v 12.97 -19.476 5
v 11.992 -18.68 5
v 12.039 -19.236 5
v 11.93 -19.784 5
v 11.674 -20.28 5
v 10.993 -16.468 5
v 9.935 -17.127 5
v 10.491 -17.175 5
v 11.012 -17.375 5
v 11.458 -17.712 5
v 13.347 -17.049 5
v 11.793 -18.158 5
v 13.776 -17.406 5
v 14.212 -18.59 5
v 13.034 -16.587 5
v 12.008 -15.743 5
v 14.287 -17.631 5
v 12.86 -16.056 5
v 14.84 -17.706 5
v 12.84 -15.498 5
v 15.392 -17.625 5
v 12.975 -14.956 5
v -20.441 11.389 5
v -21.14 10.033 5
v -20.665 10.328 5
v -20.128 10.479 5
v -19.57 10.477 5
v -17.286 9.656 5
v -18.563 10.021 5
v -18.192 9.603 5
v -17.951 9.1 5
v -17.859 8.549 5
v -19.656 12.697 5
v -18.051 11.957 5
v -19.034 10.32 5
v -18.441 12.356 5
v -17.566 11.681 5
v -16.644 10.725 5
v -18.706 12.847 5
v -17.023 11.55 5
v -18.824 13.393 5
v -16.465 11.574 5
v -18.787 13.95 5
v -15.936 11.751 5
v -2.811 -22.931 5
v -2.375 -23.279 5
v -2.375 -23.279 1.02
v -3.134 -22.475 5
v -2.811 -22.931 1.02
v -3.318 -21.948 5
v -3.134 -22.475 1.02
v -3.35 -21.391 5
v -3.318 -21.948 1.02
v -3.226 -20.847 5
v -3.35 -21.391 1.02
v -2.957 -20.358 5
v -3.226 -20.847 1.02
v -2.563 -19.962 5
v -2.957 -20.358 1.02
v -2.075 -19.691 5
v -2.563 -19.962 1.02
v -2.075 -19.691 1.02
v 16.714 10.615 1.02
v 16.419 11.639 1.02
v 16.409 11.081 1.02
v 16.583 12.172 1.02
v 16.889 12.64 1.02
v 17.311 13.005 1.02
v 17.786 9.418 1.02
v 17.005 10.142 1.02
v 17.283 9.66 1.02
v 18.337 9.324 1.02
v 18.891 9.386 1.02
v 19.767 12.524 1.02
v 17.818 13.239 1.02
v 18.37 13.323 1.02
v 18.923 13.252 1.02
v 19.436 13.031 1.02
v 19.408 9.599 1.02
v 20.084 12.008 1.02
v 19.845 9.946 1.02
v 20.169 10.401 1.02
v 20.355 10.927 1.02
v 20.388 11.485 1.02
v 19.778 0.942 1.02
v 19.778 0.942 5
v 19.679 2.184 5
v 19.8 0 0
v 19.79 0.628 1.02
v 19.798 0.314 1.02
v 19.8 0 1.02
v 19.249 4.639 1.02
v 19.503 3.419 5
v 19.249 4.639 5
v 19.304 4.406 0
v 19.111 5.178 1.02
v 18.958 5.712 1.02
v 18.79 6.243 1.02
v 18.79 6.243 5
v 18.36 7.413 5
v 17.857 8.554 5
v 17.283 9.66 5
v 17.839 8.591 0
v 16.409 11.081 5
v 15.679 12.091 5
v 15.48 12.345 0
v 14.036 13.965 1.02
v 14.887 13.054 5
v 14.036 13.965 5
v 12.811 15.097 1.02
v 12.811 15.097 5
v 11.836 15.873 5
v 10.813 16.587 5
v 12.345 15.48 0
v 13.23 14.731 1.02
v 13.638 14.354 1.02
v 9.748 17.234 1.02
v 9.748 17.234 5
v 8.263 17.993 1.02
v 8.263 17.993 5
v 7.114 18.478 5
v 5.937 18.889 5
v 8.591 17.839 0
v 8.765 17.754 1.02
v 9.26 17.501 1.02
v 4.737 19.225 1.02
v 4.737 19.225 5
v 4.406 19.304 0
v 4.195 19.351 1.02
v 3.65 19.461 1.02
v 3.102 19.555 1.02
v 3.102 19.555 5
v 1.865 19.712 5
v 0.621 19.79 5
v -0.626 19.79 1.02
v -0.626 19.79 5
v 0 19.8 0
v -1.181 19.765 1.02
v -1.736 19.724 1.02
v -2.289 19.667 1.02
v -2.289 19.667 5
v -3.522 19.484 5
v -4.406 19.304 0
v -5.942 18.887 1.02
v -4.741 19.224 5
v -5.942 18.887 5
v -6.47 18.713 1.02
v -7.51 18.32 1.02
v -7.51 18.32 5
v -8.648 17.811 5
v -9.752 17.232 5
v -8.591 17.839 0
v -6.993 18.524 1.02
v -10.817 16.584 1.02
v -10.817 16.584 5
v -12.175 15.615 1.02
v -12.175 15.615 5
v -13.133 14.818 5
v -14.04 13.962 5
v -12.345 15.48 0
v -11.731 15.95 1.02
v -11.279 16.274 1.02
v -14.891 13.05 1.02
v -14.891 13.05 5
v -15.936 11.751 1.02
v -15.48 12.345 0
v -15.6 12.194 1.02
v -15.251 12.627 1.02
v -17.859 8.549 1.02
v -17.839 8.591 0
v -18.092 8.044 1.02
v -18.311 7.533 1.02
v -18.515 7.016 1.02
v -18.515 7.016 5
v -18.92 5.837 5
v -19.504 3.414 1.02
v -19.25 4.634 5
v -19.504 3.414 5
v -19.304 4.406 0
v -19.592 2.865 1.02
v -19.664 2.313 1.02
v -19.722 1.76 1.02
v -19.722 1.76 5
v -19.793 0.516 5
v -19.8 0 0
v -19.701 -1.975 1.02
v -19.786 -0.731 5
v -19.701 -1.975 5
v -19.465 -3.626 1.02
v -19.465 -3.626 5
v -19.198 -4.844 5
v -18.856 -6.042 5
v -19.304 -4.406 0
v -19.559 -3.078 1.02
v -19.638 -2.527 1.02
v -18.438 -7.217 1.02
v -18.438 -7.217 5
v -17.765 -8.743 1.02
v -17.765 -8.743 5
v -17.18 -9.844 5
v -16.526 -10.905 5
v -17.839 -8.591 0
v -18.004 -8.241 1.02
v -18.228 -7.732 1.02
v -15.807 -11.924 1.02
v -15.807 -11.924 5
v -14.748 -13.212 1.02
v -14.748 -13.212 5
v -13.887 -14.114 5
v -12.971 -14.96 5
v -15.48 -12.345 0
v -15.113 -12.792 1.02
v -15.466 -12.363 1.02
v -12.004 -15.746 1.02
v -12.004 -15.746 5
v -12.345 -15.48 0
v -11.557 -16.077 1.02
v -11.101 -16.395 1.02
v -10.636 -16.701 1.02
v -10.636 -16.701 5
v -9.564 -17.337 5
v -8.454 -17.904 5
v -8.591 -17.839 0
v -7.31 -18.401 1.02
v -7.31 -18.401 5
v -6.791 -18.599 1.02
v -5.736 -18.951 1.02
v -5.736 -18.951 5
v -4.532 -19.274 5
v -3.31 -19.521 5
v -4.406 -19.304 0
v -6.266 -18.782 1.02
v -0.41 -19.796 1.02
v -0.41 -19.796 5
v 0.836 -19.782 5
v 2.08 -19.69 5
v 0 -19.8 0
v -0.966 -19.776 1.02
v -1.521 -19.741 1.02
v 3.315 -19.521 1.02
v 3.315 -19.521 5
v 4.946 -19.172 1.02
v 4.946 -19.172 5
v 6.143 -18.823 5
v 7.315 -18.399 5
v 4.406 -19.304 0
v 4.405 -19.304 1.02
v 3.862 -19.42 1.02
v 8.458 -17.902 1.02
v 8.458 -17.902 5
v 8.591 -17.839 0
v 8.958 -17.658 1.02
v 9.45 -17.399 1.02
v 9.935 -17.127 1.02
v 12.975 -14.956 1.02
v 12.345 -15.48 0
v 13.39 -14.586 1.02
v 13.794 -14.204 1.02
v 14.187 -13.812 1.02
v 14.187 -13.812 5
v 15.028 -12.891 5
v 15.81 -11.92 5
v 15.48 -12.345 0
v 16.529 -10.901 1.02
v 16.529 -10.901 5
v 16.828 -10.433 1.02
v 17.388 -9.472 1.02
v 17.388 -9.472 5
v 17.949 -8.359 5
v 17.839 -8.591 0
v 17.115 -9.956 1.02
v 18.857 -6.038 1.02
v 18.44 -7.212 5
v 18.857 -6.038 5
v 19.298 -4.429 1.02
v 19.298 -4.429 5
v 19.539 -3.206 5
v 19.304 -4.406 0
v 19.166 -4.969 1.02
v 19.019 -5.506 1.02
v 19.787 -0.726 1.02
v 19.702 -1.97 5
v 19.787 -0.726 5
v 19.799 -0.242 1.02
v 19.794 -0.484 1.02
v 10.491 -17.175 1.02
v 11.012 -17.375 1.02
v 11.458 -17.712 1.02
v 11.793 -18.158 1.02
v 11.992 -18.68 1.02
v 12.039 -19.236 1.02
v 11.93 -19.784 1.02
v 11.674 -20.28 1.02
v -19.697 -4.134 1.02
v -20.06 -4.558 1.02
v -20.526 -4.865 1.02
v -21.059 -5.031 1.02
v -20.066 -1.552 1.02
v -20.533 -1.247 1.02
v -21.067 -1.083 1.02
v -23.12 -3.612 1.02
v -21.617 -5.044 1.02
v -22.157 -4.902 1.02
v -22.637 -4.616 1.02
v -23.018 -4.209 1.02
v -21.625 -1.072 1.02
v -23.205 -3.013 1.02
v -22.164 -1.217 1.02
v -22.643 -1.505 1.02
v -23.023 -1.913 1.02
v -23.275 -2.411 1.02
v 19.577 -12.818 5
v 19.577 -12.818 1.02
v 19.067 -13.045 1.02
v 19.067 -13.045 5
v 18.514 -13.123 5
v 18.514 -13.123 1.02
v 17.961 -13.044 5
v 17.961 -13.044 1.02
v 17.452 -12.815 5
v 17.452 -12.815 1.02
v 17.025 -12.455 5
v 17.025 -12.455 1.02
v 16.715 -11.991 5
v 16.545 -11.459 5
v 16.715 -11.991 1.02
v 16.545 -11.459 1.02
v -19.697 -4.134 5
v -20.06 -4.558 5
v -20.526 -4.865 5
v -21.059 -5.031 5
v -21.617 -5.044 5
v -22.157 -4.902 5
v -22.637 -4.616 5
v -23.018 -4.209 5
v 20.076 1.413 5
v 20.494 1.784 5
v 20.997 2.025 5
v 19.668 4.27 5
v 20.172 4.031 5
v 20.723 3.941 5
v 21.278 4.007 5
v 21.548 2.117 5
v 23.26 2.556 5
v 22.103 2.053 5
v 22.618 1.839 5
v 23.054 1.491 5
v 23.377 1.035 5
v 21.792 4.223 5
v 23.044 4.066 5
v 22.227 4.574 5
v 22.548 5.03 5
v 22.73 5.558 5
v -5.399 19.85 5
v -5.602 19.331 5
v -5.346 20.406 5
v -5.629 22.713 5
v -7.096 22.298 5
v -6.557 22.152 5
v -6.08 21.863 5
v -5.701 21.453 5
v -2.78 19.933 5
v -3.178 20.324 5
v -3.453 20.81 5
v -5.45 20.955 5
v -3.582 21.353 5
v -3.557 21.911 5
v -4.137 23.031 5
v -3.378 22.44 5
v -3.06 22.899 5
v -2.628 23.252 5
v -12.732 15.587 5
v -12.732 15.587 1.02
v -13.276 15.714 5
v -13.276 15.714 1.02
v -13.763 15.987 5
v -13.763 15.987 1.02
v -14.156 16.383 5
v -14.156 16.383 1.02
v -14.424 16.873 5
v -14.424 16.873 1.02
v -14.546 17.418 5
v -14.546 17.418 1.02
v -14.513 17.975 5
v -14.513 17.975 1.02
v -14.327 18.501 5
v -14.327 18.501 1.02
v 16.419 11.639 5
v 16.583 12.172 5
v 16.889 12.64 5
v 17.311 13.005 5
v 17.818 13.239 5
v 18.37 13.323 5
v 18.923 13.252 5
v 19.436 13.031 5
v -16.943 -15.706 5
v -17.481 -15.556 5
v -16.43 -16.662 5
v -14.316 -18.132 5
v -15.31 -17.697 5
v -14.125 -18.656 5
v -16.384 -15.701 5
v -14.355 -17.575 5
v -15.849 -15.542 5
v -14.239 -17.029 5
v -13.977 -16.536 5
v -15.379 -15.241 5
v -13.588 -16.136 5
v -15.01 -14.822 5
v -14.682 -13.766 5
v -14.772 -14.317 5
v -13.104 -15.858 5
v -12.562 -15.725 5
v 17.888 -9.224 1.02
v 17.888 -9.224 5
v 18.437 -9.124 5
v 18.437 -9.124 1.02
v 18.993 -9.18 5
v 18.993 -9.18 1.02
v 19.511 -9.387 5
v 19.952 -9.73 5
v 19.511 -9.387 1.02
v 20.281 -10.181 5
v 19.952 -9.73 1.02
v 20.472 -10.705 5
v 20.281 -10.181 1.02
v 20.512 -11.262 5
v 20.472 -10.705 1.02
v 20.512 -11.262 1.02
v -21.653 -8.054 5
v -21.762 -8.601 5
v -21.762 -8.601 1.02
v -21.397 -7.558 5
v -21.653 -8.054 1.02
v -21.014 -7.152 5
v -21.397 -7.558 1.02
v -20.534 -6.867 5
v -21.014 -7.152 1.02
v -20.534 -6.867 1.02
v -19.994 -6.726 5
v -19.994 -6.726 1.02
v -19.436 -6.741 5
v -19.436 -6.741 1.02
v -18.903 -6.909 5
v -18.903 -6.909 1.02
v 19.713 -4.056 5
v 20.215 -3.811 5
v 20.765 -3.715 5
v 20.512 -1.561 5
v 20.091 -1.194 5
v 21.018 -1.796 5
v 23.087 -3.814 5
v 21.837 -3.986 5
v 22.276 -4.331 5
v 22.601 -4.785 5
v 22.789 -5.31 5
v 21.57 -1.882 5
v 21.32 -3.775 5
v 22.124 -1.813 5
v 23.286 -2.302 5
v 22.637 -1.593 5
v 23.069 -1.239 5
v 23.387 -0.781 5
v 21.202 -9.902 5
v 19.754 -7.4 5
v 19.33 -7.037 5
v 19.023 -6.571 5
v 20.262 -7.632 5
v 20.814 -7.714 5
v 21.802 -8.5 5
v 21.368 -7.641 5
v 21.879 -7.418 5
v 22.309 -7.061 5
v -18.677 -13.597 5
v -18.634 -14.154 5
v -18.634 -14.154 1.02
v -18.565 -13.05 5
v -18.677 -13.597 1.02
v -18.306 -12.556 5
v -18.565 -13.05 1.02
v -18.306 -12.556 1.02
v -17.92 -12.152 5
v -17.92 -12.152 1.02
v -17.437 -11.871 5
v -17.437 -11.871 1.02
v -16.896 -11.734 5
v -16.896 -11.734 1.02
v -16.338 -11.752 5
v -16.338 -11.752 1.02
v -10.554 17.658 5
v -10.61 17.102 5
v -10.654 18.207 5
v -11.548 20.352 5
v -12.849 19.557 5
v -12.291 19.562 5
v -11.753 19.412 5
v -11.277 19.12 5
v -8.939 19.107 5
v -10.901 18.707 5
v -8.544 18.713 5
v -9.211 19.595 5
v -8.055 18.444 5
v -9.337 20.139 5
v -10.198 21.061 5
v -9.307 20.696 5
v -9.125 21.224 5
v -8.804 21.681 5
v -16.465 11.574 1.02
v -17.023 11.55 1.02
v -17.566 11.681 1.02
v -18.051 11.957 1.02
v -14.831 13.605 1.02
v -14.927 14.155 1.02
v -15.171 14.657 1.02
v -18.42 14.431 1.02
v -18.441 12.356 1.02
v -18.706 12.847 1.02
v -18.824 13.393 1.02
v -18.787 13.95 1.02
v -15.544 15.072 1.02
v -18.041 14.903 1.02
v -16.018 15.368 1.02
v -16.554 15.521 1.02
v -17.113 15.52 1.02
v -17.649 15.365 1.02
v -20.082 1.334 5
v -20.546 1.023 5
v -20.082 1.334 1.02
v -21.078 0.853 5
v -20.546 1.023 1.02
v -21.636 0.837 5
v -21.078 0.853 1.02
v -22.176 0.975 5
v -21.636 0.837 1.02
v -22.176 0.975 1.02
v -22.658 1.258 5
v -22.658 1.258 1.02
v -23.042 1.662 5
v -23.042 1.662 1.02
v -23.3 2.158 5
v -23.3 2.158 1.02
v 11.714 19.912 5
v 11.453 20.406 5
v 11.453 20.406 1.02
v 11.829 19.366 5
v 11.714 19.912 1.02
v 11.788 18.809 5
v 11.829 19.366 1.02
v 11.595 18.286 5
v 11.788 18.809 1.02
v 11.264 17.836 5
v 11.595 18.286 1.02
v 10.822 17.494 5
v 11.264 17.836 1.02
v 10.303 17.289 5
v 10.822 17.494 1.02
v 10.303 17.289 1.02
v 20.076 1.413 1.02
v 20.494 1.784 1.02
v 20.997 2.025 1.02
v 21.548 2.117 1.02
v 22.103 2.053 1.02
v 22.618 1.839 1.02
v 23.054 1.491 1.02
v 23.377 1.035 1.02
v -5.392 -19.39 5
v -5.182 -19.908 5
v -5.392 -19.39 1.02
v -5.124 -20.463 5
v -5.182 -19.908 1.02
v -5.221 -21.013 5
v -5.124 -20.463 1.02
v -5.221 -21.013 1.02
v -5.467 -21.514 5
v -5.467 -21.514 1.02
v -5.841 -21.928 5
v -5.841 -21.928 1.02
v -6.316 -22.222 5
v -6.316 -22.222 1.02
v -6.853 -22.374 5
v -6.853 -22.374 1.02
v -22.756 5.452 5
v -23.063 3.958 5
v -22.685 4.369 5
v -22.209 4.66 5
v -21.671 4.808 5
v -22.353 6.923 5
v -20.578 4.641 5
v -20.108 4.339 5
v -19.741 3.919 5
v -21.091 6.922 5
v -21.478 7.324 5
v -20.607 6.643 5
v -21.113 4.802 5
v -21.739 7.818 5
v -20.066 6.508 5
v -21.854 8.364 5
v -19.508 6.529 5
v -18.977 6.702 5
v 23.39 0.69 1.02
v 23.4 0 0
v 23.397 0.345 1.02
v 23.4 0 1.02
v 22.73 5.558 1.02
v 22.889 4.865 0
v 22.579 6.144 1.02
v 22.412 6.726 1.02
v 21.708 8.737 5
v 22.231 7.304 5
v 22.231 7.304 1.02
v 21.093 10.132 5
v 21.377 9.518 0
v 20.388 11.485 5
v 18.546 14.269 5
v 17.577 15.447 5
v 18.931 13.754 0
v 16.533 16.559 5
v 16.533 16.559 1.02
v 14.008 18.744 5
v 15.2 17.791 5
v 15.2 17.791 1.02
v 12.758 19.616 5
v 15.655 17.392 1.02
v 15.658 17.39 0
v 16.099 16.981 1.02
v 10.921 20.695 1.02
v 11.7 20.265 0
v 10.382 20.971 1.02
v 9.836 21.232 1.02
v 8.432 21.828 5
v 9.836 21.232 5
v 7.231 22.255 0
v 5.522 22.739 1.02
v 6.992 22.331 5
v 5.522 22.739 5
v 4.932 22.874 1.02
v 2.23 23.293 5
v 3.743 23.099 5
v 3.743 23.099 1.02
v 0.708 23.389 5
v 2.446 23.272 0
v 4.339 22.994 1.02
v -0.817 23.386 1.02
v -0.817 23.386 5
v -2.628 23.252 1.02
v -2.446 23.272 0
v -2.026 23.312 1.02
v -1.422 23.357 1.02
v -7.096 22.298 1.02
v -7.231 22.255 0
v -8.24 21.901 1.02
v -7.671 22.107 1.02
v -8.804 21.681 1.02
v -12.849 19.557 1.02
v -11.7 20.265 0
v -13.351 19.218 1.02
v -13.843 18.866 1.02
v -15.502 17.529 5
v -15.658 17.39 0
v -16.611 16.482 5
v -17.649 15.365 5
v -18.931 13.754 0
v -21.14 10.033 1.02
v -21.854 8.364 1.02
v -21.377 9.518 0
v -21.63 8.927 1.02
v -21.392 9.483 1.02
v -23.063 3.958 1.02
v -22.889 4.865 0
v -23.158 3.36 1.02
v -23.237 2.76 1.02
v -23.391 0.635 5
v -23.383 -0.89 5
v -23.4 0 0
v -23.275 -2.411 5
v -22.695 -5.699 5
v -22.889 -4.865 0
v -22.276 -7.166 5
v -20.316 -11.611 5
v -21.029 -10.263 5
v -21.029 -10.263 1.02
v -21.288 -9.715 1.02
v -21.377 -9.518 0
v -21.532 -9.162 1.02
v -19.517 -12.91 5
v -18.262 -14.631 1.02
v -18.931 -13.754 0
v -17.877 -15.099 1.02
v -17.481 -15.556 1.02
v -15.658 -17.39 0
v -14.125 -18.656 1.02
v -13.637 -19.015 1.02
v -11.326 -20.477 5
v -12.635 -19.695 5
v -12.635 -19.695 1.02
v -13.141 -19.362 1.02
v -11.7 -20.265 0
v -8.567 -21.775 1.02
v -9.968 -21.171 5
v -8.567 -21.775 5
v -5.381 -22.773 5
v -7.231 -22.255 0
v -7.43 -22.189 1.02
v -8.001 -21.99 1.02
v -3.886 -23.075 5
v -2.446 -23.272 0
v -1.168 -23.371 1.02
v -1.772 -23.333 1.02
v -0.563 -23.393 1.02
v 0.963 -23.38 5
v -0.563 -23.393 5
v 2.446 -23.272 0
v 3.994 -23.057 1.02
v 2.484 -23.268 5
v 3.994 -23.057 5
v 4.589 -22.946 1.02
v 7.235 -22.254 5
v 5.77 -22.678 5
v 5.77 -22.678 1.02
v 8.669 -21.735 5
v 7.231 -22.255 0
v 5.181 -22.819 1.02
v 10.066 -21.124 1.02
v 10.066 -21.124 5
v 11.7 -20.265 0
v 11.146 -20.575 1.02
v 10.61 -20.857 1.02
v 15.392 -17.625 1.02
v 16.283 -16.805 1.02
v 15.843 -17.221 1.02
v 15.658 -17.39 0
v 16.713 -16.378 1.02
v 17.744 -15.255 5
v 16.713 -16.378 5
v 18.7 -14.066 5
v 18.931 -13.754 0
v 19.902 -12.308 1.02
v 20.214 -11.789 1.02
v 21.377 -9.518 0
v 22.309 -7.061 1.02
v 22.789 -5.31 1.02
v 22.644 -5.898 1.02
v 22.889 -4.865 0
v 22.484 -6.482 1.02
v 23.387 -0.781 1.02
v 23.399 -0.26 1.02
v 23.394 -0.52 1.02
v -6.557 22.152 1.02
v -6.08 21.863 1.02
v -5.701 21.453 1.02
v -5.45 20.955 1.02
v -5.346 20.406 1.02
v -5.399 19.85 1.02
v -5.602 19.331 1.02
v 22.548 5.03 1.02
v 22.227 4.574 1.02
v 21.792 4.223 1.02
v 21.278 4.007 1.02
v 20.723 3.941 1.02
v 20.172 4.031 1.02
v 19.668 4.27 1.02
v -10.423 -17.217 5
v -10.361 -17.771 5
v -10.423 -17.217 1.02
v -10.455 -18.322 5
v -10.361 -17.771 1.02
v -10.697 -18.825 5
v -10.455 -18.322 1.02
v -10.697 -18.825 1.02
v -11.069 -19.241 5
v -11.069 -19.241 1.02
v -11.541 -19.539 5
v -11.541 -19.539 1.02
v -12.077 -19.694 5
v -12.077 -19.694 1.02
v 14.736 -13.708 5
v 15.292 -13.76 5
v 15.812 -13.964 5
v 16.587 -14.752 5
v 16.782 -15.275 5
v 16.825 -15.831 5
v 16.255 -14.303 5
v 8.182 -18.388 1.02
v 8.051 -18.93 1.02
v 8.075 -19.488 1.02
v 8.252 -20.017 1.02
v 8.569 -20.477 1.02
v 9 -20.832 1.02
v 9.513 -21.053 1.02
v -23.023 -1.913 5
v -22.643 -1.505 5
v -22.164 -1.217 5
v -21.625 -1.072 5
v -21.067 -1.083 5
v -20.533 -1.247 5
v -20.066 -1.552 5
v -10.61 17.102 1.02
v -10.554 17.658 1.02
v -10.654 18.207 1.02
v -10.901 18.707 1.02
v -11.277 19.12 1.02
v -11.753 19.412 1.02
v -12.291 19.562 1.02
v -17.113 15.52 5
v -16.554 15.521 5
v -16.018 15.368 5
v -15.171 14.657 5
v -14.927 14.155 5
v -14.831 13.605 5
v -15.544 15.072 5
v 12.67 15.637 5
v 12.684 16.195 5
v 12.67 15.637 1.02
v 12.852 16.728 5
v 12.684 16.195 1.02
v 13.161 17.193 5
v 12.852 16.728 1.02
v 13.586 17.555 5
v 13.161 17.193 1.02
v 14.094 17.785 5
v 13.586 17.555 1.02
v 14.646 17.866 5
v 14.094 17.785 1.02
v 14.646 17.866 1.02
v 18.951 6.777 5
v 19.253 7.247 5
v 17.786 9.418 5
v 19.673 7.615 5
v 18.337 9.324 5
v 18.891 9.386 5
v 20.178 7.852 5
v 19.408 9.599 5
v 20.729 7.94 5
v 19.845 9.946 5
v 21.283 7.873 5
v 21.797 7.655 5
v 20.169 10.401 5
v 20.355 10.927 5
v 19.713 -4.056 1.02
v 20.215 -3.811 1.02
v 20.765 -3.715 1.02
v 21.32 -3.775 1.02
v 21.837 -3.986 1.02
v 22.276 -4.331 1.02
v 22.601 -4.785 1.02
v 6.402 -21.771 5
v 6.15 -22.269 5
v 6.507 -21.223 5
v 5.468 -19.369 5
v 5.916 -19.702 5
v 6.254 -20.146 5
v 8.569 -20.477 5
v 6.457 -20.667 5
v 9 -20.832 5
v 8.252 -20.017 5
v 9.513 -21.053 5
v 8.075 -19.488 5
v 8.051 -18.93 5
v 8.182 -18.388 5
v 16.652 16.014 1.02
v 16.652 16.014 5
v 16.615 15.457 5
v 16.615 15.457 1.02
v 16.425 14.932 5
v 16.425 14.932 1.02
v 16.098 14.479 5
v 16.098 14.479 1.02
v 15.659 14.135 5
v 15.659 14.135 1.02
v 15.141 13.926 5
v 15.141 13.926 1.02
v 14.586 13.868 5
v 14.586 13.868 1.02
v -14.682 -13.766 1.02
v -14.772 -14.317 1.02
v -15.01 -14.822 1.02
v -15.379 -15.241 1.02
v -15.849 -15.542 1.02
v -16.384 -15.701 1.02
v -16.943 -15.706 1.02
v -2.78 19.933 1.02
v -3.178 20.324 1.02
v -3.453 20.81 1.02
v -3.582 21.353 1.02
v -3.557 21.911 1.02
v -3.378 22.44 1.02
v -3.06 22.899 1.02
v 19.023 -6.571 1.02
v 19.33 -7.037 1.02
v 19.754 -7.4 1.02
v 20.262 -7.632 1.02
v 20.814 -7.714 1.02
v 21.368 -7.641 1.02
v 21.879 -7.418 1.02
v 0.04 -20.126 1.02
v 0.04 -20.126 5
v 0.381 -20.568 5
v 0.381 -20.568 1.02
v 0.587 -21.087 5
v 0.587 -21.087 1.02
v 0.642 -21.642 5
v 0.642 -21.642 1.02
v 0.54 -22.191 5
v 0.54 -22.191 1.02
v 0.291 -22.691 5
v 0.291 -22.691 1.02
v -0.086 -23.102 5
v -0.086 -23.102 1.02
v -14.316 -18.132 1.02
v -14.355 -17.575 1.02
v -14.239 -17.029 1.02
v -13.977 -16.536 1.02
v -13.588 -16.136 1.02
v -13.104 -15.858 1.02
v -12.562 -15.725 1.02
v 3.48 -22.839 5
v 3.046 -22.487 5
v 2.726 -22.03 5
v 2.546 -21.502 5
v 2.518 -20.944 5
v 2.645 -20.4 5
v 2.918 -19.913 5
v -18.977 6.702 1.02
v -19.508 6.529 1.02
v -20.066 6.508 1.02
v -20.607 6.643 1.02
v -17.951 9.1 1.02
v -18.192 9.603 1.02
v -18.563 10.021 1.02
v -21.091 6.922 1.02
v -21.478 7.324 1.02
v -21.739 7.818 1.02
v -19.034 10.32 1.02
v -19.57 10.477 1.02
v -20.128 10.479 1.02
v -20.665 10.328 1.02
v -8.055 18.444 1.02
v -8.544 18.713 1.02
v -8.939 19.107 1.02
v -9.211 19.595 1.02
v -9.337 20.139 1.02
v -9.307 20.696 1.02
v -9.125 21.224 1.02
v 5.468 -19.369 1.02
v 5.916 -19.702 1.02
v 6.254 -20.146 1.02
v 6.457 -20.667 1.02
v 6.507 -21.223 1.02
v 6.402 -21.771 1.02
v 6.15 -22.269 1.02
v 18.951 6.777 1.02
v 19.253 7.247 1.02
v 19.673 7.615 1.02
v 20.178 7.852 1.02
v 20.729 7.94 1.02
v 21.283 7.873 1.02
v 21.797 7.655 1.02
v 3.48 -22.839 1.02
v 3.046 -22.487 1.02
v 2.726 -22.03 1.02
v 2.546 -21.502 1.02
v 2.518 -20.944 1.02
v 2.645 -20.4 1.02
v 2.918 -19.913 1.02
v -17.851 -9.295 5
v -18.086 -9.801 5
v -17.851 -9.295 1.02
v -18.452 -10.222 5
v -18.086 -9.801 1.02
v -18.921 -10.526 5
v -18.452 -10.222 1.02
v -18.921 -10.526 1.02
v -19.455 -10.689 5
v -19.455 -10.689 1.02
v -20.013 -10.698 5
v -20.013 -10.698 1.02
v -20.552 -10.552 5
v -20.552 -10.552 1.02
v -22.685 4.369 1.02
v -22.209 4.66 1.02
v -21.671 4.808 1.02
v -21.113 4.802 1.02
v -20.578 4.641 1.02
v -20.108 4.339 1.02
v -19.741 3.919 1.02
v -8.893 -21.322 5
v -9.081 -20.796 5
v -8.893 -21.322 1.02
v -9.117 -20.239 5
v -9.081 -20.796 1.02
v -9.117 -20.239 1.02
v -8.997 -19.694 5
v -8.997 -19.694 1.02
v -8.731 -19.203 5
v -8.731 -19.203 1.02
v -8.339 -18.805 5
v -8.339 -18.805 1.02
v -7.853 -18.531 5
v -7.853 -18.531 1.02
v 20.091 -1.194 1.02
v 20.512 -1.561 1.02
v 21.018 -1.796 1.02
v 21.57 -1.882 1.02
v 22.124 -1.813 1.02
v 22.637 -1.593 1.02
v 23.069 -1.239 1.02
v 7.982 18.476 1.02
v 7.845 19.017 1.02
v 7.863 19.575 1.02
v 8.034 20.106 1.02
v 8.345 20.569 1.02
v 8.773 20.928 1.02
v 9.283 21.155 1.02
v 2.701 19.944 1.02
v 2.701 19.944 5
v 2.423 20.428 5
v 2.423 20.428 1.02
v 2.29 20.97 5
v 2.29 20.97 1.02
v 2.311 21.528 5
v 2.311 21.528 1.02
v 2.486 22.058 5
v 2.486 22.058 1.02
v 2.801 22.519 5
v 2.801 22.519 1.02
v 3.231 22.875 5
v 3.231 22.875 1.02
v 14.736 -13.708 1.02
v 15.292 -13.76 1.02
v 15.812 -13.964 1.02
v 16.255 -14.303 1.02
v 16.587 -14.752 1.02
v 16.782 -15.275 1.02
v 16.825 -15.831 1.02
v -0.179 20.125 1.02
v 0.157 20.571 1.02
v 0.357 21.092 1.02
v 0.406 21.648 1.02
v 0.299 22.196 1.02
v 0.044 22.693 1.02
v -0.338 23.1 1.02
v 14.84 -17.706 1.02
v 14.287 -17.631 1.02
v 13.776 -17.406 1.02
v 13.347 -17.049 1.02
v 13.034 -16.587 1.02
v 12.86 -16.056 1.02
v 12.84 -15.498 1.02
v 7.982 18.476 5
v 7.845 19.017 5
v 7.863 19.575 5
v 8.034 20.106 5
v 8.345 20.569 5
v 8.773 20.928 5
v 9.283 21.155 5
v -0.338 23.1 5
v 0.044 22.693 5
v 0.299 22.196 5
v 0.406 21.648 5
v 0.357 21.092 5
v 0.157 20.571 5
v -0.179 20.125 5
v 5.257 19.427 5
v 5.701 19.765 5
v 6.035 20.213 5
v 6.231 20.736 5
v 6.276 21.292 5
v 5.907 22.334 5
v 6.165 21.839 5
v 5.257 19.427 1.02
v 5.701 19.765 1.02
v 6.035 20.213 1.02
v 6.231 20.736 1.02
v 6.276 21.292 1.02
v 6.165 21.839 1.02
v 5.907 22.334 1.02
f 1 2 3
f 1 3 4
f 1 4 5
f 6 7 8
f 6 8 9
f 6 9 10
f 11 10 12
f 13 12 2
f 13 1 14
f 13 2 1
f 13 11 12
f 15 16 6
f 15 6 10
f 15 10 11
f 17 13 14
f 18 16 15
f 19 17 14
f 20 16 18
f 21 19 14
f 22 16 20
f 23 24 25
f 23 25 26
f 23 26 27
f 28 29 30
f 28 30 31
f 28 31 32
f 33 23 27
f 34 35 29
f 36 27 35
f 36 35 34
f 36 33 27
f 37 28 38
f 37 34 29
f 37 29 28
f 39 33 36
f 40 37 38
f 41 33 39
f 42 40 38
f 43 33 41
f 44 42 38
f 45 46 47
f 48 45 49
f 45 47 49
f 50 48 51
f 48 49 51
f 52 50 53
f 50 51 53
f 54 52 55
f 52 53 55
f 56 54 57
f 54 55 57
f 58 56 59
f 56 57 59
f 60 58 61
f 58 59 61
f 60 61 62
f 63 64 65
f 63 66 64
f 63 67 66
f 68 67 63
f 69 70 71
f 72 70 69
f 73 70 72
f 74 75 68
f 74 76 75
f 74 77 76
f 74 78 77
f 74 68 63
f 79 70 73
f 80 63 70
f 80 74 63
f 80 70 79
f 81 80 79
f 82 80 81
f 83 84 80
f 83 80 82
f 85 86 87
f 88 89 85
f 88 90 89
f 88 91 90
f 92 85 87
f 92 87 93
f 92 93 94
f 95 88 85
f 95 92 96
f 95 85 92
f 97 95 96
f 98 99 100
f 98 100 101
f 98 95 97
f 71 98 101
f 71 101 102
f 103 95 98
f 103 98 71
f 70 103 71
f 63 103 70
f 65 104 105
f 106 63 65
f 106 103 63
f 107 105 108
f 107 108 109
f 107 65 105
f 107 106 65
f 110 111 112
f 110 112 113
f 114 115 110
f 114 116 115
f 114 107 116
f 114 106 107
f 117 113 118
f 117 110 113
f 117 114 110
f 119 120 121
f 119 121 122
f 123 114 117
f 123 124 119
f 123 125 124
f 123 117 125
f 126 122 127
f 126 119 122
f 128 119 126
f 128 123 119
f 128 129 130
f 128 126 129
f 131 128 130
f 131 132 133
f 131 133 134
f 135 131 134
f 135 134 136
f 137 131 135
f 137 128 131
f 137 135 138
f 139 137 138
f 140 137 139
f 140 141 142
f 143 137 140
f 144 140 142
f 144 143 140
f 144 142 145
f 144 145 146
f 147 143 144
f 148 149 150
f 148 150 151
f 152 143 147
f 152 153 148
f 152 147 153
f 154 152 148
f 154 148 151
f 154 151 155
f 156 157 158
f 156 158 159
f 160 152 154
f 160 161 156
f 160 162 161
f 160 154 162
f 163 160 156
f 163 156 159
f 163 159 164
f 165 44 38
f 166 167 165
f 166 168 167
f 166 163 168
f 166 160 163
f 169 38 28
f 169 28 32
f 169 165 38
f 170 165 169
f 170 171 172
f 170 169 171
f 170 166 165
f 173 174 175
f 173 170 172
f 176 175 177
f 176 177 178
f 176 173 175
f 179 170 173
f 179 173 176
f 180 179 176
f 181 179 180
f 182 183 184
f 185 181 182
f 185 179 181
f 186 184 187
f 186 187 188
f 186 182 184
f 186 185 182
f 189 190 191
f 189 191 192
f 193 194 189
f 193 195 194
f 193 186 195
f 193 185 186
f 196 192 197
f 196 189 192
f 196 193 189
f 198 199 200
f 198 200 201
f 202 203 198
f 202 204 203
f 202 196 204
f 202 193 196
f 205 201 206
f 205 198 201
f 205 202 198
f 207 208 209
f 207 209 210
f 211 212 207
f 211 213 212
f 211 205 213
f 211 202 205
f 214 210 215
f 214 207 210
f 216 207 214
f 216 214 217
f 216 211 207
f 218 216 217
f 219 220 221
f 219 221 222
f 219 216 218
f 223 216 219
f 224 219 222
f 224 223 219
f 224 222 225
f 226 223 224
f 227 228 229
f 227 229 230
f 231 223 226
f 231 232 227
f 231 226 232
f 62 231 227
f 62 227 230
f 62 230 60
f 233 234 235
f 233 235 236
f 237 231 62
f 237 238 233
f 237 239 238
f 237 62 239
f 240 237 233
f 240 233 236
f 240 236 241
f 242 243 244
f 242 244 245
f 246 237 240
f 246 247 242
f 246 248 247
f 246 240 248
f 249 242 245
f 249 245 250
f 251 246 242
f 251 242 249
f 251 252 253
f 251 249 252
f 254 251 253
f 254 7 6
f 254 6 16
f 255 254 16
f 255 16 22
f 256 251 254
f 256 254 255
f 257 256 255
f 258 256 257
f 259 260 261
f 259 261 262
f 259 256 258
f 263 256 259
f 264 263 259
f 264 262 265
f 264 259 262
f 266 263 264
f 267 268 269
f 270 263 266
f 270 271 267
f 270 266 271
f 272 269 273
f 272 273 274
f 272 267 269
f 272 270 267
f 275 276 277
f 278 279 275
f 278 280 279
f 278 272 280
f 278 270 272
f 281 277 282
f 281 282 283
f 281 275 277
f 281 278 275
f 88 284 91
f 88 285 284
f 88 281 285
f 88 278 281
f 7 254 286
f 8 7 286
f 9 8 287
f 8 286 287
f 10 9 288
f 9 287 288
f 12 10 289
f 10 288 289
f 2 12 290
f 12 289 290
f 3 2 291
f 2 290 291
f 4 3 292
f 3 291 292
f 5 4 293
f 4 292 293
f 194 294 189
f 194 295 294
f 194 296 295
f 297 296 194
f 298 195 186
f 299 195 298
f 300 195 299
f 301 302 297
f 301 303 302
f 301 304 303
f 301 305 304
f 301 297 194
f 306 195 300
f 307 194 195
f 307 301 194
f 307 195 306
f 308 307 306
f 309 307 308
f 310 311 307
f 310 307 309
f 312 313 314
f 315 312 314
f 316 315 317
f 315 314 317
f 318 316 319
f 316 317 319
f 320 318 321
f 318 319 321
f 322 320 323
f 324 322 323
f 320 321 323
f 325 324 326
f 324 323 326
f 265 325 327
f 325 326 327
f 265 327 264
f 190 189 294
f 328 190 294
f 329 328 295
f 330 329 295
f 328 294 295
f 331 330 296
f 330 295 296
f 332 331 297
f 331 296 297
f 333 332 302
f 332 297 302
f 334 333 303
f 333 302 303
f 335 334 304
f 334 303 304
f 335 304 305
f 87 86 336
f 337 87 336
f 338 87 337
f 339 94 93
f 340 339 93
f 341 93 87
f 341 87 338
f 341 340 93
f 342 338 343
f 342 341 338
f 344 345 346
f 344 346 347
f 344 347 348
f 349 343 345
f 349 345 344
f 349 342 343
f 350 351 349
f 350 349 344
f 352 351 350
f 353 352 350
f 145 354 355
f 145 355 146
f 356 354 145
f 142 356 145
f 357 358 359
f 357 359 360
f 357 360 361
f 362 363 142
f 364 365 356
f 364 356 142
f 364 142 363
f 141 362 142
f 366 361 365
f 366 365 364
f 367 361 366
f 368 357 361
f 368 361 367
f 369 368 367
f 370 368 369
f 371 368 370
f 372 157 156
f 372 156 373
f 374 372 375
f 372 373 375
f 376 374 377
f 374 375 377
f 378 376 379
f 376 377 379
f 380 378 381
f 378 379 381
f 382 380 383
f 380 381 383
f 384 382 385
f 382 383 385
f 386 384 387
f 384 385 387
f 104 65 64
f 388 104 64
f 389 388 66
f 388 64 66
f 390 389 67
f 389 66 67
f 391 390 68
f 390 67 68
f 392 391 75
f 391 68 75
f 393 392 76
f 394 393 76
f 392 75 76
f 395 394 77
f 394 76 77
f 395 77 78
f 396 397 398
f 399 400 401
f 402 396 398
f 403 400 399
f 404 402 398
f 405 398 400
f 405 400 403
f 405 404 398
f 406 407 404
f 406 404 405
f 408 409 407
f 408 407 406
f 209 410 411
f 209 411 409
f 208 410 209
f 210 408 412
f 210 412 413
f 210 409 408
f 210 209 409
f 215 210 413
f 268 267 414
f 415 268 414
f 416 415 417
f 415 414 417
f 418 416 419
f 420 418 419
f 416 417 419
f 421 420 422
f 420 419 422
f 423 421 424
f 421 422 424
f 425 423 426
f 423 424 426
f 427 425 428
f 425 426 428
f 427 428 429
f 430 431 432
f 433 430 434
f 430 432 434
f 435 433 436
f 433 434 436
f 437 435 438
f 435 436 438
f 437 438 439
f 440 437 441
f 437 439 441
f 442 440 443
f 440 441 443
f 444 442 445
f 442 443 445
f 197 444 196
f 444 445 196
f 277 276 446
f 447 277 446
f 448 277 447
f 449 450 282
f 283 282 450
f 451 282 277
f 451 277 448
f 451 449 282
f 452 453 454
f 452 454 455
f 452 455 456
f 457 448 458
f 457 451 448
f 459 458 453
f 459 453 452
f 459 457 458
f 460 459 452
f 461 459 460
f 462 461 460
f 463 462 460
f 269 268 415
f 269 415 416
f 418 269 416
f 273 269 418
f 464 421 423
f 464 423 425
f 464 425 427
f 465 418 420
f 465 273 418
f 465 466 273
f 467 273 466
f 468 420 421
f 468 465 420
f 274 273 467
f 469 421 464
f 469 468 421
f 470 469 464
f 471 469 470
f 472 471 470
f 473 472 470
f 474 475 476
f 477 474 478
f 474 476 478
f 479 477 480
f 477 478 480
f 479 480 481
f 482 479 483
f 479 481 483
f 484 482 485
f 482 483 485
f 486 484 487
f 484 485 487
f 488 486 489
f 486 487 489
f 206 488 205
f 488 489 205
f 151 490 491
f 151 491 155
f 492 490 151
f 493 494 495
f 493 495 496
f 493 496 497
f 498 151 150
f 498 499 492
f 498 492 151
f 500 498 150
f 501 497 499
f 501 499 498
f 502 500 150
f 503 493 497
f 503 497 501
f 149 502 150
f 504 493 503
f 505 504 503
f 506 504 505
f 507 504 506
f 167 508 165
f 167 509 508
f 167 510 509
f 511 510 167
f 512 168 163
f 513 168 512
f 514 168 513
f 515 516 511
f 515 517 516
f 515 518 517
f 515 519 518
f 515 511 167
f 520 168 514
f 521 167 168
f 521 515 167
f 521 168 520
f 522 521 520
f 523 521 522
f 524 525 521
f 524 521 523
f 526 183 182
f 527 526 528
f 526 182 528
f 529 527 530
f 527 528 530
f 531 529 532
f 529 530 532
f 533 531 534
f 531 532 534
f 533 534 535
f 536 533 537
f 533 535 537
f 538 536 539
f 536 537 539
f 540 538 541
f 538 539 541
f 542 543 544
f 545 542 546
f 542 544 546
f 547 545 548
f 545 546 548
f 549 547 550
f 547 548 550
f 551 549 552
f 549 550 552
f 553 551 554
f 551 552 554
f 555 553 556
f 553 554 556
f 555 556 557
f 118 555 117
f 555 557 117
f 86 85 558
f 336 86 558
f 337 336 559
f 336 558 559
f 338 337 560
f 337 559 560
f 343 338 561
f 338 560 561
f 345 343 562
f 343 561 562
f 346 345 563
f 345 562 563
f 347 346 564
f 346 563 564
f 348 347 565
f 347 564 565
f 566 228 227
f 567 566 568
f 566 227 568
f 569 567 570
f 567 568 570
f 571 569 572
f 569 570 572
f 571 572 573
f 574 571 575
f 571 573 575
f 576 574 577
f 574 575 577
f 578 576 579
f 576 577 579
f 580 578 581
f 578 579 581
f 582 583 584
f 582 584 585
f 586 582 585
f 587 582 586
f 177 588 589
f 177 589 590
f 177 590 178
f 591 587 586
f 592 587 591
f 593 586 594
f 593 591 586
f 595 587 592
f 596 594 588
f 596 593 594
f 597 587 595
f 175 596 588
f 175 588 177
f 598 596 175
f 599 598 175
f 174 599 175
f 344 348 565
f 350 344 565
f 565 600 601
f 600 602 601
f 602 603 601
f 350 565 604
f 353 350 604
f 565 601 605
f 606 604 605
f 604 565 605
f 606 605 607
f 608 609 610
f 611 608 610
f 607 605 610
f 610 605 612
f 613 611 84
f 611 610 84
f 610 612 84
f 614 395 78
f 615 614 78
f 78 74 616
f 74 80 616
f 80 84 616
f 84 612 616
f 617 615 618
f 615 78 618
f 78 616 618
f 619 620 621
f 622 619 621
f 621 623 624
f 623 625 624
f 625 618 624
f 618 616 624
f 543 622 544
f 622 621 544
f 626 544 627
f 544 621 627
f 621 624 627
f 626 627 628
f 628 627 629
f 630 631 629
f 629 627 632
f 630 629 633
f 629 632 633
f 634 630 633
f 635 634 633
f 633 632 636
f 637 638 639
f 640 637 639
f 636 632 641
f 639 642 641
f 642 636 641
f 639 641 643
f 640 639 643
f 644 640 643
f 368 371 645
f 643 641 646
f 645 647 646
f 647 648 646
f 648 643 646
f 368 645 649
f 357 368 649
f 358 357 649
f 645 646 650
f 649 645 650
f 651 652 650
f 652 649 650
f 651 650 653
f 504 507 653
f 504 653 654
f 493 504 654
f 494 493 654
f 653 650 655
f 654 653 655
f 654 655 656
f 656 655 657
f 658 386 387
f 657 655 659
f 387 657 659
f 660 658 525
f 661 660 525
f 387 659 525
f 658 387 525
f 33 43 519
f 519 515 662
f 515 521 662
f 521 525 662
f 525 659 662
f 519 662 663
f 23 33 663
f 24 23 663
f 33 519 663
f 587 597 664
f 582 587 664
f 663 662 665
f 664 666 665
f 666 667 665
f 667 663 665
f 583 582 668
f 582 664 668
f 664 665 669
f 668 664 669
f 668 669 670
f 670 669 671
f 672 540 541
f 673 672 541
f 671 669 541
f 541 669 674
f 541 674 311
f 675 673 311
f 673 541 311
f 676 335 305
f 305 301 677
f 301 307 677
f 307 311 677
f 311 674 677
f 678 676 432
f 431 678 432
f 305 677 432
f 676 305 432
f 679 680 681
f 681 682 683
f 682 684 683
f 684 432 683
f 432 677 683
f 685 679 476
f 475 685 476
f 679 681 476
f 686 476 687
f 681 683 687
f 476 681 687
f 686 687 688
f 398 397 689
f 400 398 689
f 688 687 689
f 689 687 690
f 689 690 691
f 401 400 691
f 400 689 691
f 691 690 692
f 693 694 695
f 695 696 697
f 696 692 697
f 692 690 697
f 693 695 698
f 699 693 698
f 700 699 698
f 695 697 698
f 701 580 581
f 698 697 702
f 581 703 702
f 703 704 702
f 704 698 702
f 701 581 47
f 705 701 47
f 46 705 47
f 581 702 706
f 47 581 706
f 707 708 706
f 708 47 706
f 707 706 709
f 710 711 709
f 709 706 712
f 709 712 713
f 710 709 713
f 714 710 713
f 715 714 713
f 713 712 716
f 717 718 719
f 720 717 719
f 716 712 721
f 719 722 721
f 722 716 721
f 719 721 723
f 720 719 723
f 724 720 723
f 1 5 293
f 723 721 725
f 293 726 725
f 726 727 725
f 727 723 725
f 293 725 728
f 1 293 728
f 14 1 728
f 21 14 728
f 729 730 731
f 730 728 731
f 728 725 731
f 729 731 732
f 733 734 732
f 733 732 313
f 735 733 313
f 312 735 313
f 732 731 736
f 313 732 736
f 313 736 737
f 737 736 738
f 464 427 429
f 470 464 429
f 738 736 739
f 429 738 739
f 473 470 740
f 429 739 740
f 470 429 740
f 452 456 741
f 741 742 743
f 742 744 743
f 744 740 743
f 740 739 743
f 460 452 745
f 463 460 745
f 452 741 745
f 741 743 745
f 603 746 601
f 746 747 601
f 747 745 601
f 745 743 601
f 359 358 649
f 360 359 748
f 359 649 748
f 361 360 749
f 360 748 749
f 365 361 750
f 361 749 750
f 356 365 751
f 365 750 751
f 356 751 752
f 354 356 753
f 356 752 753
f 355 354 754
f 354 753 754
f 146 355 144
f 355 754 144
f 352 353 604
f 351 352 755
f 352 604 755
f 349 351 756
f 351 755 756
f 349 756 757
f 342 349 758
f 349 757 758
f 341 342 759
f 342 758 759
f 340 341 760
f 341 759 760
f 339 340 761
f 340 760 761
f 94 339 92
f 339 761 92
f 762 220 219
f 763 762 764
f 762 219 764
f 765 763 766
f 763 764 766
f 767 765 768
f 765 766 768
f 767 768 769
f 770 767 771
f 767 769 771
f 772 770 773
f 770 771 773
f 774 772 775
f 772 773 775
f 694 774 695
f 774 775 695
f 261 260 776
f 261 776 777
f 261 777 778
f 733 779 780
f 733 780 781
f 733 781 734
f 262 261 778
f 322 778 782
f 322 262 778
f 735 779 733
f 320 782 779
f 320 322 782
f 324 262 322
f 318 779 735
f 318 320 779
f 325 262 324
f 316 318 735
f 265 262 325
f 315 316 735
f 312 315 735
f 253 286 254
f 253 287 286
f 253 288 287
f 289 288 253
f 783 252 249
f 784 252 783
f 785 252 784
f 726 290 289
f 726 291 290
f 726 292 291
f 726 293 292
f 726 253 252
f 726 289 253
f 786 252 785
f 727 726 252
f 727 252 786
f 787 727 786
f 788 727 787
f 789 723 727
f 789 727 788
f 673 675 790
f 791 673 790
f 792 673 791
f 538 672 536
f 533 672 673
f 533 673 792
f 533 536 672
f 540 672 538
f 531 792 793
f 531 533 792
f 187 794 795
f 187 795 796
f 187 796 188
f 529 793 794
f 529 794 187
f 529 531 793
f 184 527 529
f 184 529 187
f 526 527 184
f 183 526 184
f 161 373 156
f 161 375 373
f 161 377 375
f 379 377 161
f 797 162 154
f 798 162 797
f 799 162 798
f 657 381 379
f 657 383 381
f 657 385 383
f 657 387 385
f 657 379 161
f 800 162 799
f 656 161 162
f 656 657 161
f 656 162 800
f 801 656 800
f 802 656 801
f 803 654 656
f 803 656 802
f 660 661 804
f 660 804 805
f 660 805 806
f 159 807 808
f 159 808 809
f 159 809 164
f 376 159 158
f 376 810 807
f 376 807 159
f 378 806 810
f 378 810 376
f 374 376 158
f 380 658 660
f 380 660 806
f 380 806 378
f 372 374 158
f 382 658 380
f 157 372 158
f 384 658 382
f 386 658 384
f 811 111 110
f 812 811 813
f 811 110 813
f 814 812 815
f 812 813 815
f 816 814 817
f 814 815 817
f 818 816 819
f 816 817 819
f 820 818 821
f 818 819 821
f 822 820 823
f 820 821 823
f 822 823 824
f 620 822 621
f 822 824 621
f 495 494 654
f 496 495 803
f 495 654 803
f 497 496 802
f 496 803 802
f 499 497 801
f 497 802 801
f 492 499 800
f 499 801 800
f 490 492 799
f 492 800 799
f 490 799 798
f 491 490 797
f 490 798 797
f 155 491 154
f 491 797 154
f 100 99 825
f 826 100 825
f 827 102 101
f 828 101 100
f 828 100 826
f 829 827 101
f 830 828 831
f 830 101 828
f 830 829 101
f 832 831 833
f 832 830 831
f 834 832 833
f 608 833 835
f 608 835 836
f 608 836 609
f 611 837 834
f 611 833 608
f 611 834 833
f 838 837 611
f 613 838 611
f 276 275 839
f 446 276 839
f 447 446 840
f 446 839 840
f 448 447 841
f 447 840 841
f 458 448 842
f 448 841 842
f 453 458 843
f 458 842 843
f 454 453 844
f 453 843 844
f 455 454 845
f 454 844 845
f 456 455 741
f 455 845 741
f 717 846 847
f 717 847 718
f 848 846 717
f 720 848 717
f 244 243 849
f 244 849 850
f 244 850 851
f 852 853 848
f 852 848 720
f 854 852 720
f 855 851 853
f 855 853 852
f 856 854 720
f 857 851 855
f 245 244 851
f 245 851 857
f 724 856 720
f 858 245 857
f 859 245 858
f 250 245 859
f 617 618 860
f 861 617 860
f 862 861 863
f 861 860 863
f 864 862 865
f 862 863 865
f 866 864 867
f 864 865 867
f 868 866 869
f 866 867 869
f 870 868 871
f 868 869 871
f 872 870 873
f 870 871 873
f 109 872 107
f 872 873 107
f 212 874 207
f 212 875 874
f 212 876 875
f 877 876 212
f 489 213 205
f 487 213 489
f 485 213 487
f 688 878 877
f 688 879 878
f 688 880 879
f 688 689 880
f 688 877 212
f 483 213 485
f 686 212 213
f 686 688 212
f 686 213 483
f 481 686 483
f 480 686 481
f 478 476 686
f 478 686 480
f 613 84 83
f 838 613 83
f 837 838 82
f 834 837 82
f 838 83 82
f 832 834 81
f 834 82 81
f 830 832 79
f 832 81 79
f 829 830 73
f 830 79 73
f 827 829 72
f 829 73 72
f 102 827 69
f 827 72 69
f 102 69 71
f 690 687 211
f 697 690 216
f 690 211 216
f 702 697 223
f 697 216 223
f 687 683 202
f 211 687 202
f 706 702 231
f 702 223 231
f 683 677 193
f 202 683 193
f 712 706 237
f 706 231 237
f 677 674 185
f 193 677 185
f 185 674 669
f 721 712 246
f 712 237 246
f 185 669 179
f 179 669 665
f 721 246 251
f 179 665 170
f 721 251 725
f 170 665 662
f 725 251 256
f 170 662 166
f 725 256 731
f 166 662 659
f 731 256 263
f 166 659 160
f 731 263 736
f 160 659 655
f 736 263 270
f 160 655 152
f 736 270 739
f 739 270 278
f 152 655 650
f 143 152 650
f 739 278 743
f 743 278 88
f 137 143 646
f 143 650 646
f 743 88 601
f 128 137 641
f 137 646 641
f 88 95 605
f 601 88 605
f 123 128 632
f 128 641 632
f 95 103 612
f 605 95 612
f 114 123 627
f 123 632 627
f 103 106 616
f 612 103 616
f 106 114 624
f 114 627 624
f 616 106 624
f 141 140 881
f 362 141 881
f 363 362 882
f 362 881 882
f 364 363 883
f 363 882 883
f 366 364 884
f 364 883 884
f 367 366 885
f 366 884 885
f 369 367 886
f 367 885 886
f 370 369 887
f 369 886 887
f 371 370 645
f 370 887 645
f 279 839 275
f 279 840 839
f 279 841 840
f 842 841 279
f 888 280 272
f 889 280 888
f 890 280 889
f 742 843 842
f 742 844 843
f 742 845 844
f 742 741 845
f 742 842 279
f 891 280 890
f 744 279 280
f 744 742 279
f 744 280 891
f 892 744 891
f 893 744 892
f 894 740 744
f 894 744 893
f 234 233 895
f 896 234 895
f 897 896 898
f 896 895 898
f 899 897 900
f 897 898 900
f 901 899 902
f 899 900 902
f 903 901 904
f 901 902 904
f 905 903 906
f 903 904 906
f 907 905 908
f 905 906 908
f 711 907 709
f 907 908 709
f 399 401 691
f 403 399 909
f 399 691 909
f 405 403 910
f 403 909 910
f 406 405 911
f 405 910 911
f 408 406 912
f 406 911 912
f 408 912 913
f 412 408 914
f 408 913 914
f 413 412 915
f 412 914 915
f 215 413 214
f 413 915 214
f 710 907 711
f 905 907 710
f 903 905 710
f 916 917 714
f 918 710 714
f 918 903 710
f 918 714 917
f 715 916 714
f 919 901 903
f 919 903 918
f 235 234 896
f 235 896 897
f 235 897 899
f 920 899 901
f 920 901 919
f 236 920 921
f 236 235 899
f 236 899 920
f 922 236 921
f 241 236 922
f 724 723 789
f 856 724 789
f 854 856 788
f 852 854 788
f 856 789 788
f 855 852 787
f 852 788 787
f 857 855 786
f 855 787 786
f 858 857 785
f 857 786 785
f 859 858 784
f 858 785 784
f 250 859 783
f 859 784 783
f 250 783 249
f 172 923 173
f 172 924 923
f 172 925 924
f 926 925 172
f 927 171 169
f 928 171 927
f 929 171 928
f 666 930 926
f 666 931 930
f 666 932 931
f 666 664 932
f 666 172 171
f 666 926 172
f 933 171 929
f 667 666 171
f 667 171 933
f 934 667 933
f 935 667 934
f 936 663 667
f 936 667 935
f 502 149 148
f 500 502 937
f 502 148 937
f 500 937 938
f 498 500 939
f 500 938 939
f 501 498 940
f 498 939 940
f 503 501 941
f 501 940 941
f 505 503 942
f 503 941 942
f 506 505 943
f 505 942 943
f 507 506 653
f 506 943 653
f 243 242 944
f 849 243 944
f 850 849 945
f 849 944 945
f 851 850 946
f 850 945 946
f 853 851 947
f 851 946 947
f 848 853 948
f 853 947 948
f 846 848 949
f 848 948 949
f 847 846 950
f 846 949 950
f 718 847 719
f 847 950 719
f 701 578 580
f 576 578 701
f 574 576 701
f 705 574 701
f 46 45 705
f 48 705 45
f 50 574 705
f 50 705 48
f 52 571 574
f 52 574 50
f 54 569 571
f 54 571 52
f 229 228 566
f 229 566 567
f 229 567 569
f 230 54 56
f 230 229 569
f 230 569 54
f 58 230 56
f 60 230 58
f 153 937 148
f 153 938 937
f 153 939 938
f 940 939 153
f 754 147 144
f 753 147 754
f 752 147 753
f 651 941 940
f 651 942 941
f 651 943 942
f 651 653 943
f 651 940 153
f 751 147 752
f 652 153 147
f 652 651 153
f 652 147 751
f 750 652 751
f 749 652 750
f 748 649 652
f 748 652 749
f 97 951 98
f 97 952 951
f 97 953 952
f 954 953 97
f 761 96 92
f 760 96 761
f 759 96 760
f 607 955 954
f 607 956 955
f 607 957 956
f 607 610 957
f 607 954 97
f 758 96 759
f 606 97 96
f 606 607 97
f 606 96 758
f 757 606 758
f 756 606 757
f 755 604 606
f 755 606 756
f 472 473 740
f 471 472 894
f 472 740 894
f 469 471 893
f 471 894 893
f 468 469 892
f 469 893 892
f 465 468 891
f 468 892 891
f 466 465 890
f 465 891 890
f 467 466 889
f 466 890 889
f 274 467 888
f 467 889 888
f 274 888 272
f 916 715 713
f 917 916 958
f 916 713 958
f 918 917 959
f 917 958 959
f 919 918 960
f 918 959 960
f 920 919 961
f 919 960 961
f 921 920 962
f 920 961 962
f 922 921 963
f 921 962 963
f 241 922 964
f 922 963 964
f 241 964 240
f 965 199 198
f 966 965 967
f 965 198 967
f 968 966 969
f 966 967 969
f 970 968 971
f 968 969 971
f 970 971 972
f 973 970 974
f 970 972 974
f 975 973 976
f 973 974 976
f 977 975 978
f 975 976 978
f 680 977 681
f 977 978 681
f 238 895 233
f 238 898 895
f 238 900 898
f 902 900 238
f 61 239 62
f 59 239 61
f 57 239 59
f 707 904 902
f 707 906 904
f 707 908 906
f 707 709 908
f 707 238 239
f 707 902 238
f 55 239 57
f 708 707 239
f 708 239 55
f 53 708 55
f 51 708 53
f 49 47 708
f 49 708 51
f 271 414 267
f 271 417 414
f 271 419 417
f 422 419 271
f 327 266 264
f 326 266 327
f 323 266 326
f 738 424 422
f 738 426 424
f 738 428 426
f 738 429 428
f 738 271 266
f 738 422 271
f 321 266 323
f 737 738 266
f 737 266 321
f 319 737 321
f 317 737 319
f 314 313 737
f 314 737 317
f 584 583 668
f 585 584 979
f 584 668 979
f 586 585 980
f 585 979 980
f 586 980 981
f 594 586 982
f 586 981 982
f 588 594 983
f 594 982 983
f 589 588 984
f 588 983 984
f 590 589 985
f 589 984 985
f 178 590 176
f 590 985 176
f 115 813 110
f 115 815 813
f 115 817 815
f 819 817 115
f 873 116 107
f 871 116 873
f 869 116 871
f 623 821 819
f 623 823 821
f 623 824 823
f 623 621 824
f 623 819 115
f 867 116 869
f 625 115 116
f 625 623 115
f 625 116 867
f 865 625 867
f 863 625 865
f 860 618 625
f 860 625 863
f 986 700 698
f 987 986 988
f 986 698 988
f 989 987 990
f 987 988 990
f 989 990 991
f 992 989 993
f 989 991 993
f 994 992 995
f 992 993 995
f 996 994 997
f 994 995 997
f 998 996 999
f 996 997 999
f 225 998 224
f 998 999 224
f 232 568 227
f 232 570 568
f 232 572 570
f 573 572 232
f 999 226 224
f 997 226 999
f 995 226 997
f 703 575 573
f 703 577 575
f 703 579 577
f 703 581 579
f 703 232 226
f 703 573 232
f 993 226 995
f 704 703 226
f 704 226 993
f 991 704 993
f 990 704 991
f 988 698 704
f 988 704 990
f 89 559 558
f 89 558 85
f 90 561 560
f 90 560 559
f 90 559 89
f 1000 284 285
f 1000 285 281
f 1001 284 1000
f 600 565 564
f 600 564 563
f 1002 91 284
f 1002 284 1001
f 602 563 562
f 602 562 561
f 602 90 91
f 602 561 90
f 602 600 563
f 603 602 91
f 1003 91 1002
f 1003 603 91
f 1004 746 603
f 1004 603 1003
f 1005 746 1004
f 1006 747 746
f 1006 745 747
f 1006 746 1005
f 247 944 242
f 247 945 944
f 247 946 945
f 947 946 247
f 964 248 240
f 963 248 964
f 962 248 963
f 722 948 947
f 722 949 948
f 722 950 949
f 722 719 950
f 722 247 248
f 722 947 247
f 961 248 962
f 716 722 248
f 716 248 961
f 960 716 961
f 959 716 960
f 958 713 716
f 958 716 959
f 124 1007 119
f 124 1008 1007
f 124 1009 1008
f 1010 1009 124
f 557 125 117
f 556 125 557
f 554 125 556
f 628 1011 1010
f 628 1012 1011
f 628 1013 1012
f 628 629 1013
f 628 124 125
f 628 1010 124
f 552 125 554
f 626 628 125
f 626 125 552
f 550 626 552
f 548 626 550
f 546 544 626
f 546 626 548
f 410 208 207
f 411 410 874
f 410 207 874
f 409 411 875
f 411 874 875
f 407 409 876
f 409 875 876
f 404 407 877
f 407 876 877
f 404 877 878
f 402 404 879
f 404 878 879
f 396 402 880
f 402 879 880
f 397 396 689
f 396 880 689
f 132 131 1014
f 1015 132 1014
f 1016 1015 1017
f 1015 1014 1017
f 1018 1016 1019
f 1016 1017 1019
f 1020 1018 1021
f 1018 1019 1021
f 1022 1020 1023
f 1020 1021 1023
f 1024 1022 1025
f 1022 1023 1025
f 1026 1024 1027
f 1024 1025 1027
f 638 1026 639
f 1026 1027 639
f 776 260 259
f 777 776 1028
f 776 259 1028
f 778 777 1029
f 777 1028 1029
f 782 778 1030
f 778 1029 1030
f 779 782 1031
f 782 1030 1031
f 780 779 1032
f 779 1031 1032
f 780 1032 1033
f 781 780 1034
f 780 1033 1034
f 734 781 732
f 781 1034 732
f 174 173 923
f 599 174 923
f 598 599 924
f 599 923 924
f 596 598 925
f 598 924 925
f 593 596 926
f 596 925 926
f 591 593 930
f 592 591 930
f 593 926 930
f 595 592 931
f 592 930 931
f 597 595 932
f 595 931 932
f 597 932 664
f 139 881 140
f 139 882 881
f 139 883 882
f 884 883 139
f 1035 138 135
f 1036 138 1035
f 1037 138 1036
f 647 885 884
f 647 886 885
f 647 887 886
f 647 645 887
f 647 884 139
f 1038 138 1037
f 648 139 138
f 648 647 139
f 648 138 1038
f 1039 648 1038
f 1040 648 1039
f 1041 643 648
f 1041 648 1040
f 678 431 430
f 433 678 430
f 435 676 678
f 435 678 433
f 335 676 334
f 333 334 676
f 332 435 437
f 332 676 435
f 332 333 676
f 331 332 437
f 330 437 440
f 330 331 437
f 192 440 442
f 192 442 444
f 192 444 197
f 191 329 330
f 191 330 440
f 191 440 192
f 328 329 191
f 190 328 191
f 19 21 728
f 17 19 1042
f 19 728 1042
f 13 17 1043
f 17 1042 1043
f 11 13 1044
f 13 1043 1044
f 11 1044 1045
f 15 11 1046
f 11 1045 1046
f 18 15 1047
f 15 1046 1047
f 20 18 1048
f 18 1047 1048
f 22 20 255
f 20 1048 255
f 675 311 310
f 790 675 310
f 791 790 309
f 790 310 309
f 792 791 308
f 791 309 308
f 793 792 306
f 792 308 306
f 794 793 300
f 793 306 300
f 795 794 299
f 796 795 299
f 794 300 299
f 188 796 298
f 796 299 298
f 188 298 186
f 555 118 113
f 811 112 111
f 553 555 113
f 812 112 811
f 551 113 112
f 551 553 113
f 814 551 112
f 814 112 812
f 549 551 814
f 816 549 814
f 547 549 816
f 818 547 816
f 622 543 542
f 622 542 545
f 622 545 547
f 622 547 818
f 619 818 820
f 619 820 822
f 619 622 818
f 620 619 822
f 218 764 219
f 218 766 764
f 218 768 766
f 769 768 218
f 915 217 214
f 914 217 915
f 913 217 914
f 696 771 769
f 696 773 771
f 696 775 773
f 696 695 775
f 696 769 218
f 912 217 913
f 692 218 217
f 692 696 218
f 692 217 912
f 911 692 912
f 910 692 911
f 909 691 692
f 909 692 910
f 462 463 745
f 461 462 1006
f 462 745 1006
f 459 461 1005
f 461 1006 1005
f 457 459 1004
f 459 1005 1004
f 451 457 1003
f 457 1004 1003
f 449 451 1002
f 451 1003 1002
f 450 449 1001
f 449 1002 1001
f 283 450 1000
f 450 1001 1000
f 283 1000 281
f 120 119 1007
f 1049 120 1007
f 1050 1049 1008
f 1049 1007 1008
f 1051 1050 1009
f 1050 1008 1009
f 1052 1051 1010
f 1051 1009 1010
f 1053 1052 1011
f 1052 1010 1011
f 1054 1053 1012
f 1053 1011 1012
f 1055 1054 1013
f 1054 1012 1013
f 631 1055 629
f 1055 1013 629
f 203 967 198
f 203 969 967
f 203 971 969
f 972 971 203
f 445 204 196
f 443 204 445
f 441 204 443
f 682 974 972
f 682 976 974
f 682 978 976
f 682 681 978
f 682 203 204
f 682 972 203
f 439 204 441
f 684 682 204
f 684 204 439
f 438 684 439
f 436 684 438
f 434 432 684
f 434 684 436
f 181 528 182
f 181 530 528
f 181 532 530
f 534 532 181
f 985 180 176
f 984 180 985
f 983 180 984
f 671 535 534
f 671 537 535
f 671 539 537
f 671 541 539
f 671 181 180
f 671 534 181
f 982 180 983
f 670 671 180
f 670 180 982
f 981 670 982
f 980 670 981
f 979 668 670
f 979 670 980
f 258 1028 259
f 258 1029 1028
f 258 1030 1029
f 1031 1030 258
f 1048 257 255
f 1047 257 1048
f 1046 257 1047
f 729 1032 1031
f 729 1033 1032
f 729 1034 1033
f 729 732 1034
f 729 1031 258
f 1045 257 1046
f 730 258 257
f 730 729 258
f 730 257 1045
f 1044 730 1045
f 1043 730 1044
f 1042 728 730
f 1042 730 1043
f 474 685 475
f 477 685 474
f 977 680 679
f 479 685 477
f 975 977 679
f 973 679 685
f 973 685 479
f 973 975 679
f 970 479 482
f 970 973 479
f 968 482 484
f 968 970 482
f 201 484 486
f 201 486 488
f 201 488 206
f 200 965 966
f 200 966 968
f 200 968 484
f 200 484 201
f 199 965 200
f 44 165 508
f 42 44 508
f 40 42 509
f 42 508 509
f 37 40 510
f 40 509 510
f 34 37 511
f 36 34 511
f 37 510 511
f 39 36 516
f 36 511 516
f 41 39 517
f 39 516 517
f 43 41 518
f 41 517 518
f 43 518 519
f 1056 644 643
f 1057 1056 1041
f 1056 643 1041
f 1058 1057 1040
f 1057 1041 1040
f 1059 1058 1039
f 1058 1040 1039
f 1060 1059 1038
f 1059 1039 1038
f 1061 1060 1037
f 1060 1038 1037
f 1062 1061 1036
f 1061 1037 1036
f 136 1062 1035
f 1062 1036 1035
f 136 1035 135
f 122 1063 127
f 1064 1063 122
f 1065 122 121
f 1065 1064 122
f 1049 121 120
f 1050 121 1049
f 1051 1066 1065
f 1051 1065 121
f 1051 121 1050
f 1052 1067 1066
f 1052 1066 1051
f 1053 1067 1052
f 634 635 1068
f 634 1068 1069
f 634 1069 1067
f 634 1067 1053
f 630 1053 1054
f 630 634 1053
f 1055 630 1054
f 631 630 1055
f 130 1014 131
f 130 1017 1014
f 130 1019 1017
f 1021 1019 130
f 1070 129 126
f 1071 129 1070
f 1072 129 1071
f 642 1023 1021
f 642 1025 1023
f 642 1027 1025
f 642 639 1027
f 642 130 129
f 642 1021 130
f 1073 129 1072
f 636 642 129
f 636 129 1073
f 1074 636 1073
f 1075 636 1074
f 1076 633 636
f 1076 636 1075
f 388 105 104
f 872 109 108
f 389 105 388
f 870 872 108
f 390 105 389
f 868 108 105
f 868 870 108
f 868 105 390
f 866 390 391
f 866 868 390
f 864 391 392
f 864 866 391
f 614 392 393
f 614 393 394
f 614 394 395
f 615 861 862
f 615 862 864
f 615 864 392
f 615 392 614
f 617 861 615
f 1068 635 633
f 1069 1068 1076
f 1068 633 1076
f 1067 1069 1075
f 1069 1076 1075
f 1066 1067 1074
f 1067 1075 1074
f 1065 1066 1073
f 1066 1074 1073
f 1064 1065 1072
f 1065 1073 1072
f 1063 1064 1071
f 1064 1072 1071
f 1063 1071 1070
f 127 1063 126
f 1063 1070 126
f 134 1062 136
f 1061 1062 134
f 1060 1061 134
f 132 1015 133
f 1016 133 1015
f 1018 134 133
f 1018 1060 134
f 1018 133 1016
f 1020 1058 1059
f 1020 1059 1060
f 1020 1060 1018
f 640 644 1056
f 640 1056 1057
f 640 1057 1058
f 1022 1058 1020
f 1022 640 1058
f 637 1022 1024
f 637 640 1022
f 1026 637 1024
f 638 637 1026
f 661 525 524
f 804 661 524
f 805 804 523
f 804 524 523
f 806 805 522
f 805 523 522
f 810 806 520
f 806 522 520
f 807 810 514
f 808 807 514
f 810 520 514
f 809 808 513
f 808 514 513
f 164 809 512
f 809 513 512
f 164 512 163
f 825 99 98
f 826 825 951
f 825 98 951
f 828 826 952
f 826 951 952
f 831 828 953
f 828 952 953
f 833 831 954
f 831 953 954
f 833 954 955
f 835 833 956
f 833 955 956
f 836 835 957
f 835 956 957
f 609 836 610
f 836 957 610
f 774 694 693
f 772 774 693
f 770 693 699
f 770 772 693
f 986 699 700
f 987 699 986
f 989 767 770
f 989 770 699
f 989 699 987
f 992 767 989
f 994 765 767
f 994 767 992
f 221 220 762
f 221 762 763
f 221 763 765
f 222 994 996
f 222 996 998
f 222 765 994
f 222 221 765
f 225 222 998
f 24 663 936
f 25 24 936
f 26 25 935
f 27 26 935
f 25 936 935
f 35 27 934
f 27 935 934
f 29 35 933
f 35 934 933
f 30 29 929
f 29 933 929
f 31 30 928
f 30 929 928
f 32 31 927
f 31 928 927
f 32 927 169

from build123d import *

# Parameters (mm, degrees)
SKETCH_1_R               = 23.4
SKETCH_1_R_2             = 19.8
EXTRUDE_1_DEPTH          = 5
SKETCH_2_W               = 4
SKETCH_2_H               = 2
PATTERN_CIRCULAR_1_COUNT = 23


with BuildPart() as part:
    # 草图1 → 凸台-拉伸1 (new body)
    with BuildSketch(Plane.XY):
        Circle(SKETCH_1_R)
        Circle(SKETCH_1_R_2, mode=Mode.SUBTRACT)
    extrude(amount=EXTRUDE_1_DEPTH)

    # 草图2 → 切除-旋转1 (revolve, cut)
    with BuildSketch(Plane(origin=(21.6, 0, 0), x_dir=(0, 0, -1), z_dir=(1, 0, 0))):
        with Locations((-3.020321316, 1.11760291)):
            Rectangle(SKETCH_2_W, SKETCH_2_H)
    cut_revolve_1 = revolve(axis=Axis((21.6, 0.11760291, 5.020321316), (0, 0, -1)), mode=Mode.SUBTRACT)

    # 阵列(圆周)1: 切除-旋转1 ×23 about axis
    pattern_circular_1_axis = Axis((0, 0, 0), (0, 0, 1))
    for i in range(1, PATTERN_CIRCULAR_1_COUNT):
        add(cut_revolve_1.rotate(pattern_circular_1_axis, i * 360 / PATTERN_CIRCULAR_1_COUNT), mode=Mode.SUBTRACT)


solid = part.part
